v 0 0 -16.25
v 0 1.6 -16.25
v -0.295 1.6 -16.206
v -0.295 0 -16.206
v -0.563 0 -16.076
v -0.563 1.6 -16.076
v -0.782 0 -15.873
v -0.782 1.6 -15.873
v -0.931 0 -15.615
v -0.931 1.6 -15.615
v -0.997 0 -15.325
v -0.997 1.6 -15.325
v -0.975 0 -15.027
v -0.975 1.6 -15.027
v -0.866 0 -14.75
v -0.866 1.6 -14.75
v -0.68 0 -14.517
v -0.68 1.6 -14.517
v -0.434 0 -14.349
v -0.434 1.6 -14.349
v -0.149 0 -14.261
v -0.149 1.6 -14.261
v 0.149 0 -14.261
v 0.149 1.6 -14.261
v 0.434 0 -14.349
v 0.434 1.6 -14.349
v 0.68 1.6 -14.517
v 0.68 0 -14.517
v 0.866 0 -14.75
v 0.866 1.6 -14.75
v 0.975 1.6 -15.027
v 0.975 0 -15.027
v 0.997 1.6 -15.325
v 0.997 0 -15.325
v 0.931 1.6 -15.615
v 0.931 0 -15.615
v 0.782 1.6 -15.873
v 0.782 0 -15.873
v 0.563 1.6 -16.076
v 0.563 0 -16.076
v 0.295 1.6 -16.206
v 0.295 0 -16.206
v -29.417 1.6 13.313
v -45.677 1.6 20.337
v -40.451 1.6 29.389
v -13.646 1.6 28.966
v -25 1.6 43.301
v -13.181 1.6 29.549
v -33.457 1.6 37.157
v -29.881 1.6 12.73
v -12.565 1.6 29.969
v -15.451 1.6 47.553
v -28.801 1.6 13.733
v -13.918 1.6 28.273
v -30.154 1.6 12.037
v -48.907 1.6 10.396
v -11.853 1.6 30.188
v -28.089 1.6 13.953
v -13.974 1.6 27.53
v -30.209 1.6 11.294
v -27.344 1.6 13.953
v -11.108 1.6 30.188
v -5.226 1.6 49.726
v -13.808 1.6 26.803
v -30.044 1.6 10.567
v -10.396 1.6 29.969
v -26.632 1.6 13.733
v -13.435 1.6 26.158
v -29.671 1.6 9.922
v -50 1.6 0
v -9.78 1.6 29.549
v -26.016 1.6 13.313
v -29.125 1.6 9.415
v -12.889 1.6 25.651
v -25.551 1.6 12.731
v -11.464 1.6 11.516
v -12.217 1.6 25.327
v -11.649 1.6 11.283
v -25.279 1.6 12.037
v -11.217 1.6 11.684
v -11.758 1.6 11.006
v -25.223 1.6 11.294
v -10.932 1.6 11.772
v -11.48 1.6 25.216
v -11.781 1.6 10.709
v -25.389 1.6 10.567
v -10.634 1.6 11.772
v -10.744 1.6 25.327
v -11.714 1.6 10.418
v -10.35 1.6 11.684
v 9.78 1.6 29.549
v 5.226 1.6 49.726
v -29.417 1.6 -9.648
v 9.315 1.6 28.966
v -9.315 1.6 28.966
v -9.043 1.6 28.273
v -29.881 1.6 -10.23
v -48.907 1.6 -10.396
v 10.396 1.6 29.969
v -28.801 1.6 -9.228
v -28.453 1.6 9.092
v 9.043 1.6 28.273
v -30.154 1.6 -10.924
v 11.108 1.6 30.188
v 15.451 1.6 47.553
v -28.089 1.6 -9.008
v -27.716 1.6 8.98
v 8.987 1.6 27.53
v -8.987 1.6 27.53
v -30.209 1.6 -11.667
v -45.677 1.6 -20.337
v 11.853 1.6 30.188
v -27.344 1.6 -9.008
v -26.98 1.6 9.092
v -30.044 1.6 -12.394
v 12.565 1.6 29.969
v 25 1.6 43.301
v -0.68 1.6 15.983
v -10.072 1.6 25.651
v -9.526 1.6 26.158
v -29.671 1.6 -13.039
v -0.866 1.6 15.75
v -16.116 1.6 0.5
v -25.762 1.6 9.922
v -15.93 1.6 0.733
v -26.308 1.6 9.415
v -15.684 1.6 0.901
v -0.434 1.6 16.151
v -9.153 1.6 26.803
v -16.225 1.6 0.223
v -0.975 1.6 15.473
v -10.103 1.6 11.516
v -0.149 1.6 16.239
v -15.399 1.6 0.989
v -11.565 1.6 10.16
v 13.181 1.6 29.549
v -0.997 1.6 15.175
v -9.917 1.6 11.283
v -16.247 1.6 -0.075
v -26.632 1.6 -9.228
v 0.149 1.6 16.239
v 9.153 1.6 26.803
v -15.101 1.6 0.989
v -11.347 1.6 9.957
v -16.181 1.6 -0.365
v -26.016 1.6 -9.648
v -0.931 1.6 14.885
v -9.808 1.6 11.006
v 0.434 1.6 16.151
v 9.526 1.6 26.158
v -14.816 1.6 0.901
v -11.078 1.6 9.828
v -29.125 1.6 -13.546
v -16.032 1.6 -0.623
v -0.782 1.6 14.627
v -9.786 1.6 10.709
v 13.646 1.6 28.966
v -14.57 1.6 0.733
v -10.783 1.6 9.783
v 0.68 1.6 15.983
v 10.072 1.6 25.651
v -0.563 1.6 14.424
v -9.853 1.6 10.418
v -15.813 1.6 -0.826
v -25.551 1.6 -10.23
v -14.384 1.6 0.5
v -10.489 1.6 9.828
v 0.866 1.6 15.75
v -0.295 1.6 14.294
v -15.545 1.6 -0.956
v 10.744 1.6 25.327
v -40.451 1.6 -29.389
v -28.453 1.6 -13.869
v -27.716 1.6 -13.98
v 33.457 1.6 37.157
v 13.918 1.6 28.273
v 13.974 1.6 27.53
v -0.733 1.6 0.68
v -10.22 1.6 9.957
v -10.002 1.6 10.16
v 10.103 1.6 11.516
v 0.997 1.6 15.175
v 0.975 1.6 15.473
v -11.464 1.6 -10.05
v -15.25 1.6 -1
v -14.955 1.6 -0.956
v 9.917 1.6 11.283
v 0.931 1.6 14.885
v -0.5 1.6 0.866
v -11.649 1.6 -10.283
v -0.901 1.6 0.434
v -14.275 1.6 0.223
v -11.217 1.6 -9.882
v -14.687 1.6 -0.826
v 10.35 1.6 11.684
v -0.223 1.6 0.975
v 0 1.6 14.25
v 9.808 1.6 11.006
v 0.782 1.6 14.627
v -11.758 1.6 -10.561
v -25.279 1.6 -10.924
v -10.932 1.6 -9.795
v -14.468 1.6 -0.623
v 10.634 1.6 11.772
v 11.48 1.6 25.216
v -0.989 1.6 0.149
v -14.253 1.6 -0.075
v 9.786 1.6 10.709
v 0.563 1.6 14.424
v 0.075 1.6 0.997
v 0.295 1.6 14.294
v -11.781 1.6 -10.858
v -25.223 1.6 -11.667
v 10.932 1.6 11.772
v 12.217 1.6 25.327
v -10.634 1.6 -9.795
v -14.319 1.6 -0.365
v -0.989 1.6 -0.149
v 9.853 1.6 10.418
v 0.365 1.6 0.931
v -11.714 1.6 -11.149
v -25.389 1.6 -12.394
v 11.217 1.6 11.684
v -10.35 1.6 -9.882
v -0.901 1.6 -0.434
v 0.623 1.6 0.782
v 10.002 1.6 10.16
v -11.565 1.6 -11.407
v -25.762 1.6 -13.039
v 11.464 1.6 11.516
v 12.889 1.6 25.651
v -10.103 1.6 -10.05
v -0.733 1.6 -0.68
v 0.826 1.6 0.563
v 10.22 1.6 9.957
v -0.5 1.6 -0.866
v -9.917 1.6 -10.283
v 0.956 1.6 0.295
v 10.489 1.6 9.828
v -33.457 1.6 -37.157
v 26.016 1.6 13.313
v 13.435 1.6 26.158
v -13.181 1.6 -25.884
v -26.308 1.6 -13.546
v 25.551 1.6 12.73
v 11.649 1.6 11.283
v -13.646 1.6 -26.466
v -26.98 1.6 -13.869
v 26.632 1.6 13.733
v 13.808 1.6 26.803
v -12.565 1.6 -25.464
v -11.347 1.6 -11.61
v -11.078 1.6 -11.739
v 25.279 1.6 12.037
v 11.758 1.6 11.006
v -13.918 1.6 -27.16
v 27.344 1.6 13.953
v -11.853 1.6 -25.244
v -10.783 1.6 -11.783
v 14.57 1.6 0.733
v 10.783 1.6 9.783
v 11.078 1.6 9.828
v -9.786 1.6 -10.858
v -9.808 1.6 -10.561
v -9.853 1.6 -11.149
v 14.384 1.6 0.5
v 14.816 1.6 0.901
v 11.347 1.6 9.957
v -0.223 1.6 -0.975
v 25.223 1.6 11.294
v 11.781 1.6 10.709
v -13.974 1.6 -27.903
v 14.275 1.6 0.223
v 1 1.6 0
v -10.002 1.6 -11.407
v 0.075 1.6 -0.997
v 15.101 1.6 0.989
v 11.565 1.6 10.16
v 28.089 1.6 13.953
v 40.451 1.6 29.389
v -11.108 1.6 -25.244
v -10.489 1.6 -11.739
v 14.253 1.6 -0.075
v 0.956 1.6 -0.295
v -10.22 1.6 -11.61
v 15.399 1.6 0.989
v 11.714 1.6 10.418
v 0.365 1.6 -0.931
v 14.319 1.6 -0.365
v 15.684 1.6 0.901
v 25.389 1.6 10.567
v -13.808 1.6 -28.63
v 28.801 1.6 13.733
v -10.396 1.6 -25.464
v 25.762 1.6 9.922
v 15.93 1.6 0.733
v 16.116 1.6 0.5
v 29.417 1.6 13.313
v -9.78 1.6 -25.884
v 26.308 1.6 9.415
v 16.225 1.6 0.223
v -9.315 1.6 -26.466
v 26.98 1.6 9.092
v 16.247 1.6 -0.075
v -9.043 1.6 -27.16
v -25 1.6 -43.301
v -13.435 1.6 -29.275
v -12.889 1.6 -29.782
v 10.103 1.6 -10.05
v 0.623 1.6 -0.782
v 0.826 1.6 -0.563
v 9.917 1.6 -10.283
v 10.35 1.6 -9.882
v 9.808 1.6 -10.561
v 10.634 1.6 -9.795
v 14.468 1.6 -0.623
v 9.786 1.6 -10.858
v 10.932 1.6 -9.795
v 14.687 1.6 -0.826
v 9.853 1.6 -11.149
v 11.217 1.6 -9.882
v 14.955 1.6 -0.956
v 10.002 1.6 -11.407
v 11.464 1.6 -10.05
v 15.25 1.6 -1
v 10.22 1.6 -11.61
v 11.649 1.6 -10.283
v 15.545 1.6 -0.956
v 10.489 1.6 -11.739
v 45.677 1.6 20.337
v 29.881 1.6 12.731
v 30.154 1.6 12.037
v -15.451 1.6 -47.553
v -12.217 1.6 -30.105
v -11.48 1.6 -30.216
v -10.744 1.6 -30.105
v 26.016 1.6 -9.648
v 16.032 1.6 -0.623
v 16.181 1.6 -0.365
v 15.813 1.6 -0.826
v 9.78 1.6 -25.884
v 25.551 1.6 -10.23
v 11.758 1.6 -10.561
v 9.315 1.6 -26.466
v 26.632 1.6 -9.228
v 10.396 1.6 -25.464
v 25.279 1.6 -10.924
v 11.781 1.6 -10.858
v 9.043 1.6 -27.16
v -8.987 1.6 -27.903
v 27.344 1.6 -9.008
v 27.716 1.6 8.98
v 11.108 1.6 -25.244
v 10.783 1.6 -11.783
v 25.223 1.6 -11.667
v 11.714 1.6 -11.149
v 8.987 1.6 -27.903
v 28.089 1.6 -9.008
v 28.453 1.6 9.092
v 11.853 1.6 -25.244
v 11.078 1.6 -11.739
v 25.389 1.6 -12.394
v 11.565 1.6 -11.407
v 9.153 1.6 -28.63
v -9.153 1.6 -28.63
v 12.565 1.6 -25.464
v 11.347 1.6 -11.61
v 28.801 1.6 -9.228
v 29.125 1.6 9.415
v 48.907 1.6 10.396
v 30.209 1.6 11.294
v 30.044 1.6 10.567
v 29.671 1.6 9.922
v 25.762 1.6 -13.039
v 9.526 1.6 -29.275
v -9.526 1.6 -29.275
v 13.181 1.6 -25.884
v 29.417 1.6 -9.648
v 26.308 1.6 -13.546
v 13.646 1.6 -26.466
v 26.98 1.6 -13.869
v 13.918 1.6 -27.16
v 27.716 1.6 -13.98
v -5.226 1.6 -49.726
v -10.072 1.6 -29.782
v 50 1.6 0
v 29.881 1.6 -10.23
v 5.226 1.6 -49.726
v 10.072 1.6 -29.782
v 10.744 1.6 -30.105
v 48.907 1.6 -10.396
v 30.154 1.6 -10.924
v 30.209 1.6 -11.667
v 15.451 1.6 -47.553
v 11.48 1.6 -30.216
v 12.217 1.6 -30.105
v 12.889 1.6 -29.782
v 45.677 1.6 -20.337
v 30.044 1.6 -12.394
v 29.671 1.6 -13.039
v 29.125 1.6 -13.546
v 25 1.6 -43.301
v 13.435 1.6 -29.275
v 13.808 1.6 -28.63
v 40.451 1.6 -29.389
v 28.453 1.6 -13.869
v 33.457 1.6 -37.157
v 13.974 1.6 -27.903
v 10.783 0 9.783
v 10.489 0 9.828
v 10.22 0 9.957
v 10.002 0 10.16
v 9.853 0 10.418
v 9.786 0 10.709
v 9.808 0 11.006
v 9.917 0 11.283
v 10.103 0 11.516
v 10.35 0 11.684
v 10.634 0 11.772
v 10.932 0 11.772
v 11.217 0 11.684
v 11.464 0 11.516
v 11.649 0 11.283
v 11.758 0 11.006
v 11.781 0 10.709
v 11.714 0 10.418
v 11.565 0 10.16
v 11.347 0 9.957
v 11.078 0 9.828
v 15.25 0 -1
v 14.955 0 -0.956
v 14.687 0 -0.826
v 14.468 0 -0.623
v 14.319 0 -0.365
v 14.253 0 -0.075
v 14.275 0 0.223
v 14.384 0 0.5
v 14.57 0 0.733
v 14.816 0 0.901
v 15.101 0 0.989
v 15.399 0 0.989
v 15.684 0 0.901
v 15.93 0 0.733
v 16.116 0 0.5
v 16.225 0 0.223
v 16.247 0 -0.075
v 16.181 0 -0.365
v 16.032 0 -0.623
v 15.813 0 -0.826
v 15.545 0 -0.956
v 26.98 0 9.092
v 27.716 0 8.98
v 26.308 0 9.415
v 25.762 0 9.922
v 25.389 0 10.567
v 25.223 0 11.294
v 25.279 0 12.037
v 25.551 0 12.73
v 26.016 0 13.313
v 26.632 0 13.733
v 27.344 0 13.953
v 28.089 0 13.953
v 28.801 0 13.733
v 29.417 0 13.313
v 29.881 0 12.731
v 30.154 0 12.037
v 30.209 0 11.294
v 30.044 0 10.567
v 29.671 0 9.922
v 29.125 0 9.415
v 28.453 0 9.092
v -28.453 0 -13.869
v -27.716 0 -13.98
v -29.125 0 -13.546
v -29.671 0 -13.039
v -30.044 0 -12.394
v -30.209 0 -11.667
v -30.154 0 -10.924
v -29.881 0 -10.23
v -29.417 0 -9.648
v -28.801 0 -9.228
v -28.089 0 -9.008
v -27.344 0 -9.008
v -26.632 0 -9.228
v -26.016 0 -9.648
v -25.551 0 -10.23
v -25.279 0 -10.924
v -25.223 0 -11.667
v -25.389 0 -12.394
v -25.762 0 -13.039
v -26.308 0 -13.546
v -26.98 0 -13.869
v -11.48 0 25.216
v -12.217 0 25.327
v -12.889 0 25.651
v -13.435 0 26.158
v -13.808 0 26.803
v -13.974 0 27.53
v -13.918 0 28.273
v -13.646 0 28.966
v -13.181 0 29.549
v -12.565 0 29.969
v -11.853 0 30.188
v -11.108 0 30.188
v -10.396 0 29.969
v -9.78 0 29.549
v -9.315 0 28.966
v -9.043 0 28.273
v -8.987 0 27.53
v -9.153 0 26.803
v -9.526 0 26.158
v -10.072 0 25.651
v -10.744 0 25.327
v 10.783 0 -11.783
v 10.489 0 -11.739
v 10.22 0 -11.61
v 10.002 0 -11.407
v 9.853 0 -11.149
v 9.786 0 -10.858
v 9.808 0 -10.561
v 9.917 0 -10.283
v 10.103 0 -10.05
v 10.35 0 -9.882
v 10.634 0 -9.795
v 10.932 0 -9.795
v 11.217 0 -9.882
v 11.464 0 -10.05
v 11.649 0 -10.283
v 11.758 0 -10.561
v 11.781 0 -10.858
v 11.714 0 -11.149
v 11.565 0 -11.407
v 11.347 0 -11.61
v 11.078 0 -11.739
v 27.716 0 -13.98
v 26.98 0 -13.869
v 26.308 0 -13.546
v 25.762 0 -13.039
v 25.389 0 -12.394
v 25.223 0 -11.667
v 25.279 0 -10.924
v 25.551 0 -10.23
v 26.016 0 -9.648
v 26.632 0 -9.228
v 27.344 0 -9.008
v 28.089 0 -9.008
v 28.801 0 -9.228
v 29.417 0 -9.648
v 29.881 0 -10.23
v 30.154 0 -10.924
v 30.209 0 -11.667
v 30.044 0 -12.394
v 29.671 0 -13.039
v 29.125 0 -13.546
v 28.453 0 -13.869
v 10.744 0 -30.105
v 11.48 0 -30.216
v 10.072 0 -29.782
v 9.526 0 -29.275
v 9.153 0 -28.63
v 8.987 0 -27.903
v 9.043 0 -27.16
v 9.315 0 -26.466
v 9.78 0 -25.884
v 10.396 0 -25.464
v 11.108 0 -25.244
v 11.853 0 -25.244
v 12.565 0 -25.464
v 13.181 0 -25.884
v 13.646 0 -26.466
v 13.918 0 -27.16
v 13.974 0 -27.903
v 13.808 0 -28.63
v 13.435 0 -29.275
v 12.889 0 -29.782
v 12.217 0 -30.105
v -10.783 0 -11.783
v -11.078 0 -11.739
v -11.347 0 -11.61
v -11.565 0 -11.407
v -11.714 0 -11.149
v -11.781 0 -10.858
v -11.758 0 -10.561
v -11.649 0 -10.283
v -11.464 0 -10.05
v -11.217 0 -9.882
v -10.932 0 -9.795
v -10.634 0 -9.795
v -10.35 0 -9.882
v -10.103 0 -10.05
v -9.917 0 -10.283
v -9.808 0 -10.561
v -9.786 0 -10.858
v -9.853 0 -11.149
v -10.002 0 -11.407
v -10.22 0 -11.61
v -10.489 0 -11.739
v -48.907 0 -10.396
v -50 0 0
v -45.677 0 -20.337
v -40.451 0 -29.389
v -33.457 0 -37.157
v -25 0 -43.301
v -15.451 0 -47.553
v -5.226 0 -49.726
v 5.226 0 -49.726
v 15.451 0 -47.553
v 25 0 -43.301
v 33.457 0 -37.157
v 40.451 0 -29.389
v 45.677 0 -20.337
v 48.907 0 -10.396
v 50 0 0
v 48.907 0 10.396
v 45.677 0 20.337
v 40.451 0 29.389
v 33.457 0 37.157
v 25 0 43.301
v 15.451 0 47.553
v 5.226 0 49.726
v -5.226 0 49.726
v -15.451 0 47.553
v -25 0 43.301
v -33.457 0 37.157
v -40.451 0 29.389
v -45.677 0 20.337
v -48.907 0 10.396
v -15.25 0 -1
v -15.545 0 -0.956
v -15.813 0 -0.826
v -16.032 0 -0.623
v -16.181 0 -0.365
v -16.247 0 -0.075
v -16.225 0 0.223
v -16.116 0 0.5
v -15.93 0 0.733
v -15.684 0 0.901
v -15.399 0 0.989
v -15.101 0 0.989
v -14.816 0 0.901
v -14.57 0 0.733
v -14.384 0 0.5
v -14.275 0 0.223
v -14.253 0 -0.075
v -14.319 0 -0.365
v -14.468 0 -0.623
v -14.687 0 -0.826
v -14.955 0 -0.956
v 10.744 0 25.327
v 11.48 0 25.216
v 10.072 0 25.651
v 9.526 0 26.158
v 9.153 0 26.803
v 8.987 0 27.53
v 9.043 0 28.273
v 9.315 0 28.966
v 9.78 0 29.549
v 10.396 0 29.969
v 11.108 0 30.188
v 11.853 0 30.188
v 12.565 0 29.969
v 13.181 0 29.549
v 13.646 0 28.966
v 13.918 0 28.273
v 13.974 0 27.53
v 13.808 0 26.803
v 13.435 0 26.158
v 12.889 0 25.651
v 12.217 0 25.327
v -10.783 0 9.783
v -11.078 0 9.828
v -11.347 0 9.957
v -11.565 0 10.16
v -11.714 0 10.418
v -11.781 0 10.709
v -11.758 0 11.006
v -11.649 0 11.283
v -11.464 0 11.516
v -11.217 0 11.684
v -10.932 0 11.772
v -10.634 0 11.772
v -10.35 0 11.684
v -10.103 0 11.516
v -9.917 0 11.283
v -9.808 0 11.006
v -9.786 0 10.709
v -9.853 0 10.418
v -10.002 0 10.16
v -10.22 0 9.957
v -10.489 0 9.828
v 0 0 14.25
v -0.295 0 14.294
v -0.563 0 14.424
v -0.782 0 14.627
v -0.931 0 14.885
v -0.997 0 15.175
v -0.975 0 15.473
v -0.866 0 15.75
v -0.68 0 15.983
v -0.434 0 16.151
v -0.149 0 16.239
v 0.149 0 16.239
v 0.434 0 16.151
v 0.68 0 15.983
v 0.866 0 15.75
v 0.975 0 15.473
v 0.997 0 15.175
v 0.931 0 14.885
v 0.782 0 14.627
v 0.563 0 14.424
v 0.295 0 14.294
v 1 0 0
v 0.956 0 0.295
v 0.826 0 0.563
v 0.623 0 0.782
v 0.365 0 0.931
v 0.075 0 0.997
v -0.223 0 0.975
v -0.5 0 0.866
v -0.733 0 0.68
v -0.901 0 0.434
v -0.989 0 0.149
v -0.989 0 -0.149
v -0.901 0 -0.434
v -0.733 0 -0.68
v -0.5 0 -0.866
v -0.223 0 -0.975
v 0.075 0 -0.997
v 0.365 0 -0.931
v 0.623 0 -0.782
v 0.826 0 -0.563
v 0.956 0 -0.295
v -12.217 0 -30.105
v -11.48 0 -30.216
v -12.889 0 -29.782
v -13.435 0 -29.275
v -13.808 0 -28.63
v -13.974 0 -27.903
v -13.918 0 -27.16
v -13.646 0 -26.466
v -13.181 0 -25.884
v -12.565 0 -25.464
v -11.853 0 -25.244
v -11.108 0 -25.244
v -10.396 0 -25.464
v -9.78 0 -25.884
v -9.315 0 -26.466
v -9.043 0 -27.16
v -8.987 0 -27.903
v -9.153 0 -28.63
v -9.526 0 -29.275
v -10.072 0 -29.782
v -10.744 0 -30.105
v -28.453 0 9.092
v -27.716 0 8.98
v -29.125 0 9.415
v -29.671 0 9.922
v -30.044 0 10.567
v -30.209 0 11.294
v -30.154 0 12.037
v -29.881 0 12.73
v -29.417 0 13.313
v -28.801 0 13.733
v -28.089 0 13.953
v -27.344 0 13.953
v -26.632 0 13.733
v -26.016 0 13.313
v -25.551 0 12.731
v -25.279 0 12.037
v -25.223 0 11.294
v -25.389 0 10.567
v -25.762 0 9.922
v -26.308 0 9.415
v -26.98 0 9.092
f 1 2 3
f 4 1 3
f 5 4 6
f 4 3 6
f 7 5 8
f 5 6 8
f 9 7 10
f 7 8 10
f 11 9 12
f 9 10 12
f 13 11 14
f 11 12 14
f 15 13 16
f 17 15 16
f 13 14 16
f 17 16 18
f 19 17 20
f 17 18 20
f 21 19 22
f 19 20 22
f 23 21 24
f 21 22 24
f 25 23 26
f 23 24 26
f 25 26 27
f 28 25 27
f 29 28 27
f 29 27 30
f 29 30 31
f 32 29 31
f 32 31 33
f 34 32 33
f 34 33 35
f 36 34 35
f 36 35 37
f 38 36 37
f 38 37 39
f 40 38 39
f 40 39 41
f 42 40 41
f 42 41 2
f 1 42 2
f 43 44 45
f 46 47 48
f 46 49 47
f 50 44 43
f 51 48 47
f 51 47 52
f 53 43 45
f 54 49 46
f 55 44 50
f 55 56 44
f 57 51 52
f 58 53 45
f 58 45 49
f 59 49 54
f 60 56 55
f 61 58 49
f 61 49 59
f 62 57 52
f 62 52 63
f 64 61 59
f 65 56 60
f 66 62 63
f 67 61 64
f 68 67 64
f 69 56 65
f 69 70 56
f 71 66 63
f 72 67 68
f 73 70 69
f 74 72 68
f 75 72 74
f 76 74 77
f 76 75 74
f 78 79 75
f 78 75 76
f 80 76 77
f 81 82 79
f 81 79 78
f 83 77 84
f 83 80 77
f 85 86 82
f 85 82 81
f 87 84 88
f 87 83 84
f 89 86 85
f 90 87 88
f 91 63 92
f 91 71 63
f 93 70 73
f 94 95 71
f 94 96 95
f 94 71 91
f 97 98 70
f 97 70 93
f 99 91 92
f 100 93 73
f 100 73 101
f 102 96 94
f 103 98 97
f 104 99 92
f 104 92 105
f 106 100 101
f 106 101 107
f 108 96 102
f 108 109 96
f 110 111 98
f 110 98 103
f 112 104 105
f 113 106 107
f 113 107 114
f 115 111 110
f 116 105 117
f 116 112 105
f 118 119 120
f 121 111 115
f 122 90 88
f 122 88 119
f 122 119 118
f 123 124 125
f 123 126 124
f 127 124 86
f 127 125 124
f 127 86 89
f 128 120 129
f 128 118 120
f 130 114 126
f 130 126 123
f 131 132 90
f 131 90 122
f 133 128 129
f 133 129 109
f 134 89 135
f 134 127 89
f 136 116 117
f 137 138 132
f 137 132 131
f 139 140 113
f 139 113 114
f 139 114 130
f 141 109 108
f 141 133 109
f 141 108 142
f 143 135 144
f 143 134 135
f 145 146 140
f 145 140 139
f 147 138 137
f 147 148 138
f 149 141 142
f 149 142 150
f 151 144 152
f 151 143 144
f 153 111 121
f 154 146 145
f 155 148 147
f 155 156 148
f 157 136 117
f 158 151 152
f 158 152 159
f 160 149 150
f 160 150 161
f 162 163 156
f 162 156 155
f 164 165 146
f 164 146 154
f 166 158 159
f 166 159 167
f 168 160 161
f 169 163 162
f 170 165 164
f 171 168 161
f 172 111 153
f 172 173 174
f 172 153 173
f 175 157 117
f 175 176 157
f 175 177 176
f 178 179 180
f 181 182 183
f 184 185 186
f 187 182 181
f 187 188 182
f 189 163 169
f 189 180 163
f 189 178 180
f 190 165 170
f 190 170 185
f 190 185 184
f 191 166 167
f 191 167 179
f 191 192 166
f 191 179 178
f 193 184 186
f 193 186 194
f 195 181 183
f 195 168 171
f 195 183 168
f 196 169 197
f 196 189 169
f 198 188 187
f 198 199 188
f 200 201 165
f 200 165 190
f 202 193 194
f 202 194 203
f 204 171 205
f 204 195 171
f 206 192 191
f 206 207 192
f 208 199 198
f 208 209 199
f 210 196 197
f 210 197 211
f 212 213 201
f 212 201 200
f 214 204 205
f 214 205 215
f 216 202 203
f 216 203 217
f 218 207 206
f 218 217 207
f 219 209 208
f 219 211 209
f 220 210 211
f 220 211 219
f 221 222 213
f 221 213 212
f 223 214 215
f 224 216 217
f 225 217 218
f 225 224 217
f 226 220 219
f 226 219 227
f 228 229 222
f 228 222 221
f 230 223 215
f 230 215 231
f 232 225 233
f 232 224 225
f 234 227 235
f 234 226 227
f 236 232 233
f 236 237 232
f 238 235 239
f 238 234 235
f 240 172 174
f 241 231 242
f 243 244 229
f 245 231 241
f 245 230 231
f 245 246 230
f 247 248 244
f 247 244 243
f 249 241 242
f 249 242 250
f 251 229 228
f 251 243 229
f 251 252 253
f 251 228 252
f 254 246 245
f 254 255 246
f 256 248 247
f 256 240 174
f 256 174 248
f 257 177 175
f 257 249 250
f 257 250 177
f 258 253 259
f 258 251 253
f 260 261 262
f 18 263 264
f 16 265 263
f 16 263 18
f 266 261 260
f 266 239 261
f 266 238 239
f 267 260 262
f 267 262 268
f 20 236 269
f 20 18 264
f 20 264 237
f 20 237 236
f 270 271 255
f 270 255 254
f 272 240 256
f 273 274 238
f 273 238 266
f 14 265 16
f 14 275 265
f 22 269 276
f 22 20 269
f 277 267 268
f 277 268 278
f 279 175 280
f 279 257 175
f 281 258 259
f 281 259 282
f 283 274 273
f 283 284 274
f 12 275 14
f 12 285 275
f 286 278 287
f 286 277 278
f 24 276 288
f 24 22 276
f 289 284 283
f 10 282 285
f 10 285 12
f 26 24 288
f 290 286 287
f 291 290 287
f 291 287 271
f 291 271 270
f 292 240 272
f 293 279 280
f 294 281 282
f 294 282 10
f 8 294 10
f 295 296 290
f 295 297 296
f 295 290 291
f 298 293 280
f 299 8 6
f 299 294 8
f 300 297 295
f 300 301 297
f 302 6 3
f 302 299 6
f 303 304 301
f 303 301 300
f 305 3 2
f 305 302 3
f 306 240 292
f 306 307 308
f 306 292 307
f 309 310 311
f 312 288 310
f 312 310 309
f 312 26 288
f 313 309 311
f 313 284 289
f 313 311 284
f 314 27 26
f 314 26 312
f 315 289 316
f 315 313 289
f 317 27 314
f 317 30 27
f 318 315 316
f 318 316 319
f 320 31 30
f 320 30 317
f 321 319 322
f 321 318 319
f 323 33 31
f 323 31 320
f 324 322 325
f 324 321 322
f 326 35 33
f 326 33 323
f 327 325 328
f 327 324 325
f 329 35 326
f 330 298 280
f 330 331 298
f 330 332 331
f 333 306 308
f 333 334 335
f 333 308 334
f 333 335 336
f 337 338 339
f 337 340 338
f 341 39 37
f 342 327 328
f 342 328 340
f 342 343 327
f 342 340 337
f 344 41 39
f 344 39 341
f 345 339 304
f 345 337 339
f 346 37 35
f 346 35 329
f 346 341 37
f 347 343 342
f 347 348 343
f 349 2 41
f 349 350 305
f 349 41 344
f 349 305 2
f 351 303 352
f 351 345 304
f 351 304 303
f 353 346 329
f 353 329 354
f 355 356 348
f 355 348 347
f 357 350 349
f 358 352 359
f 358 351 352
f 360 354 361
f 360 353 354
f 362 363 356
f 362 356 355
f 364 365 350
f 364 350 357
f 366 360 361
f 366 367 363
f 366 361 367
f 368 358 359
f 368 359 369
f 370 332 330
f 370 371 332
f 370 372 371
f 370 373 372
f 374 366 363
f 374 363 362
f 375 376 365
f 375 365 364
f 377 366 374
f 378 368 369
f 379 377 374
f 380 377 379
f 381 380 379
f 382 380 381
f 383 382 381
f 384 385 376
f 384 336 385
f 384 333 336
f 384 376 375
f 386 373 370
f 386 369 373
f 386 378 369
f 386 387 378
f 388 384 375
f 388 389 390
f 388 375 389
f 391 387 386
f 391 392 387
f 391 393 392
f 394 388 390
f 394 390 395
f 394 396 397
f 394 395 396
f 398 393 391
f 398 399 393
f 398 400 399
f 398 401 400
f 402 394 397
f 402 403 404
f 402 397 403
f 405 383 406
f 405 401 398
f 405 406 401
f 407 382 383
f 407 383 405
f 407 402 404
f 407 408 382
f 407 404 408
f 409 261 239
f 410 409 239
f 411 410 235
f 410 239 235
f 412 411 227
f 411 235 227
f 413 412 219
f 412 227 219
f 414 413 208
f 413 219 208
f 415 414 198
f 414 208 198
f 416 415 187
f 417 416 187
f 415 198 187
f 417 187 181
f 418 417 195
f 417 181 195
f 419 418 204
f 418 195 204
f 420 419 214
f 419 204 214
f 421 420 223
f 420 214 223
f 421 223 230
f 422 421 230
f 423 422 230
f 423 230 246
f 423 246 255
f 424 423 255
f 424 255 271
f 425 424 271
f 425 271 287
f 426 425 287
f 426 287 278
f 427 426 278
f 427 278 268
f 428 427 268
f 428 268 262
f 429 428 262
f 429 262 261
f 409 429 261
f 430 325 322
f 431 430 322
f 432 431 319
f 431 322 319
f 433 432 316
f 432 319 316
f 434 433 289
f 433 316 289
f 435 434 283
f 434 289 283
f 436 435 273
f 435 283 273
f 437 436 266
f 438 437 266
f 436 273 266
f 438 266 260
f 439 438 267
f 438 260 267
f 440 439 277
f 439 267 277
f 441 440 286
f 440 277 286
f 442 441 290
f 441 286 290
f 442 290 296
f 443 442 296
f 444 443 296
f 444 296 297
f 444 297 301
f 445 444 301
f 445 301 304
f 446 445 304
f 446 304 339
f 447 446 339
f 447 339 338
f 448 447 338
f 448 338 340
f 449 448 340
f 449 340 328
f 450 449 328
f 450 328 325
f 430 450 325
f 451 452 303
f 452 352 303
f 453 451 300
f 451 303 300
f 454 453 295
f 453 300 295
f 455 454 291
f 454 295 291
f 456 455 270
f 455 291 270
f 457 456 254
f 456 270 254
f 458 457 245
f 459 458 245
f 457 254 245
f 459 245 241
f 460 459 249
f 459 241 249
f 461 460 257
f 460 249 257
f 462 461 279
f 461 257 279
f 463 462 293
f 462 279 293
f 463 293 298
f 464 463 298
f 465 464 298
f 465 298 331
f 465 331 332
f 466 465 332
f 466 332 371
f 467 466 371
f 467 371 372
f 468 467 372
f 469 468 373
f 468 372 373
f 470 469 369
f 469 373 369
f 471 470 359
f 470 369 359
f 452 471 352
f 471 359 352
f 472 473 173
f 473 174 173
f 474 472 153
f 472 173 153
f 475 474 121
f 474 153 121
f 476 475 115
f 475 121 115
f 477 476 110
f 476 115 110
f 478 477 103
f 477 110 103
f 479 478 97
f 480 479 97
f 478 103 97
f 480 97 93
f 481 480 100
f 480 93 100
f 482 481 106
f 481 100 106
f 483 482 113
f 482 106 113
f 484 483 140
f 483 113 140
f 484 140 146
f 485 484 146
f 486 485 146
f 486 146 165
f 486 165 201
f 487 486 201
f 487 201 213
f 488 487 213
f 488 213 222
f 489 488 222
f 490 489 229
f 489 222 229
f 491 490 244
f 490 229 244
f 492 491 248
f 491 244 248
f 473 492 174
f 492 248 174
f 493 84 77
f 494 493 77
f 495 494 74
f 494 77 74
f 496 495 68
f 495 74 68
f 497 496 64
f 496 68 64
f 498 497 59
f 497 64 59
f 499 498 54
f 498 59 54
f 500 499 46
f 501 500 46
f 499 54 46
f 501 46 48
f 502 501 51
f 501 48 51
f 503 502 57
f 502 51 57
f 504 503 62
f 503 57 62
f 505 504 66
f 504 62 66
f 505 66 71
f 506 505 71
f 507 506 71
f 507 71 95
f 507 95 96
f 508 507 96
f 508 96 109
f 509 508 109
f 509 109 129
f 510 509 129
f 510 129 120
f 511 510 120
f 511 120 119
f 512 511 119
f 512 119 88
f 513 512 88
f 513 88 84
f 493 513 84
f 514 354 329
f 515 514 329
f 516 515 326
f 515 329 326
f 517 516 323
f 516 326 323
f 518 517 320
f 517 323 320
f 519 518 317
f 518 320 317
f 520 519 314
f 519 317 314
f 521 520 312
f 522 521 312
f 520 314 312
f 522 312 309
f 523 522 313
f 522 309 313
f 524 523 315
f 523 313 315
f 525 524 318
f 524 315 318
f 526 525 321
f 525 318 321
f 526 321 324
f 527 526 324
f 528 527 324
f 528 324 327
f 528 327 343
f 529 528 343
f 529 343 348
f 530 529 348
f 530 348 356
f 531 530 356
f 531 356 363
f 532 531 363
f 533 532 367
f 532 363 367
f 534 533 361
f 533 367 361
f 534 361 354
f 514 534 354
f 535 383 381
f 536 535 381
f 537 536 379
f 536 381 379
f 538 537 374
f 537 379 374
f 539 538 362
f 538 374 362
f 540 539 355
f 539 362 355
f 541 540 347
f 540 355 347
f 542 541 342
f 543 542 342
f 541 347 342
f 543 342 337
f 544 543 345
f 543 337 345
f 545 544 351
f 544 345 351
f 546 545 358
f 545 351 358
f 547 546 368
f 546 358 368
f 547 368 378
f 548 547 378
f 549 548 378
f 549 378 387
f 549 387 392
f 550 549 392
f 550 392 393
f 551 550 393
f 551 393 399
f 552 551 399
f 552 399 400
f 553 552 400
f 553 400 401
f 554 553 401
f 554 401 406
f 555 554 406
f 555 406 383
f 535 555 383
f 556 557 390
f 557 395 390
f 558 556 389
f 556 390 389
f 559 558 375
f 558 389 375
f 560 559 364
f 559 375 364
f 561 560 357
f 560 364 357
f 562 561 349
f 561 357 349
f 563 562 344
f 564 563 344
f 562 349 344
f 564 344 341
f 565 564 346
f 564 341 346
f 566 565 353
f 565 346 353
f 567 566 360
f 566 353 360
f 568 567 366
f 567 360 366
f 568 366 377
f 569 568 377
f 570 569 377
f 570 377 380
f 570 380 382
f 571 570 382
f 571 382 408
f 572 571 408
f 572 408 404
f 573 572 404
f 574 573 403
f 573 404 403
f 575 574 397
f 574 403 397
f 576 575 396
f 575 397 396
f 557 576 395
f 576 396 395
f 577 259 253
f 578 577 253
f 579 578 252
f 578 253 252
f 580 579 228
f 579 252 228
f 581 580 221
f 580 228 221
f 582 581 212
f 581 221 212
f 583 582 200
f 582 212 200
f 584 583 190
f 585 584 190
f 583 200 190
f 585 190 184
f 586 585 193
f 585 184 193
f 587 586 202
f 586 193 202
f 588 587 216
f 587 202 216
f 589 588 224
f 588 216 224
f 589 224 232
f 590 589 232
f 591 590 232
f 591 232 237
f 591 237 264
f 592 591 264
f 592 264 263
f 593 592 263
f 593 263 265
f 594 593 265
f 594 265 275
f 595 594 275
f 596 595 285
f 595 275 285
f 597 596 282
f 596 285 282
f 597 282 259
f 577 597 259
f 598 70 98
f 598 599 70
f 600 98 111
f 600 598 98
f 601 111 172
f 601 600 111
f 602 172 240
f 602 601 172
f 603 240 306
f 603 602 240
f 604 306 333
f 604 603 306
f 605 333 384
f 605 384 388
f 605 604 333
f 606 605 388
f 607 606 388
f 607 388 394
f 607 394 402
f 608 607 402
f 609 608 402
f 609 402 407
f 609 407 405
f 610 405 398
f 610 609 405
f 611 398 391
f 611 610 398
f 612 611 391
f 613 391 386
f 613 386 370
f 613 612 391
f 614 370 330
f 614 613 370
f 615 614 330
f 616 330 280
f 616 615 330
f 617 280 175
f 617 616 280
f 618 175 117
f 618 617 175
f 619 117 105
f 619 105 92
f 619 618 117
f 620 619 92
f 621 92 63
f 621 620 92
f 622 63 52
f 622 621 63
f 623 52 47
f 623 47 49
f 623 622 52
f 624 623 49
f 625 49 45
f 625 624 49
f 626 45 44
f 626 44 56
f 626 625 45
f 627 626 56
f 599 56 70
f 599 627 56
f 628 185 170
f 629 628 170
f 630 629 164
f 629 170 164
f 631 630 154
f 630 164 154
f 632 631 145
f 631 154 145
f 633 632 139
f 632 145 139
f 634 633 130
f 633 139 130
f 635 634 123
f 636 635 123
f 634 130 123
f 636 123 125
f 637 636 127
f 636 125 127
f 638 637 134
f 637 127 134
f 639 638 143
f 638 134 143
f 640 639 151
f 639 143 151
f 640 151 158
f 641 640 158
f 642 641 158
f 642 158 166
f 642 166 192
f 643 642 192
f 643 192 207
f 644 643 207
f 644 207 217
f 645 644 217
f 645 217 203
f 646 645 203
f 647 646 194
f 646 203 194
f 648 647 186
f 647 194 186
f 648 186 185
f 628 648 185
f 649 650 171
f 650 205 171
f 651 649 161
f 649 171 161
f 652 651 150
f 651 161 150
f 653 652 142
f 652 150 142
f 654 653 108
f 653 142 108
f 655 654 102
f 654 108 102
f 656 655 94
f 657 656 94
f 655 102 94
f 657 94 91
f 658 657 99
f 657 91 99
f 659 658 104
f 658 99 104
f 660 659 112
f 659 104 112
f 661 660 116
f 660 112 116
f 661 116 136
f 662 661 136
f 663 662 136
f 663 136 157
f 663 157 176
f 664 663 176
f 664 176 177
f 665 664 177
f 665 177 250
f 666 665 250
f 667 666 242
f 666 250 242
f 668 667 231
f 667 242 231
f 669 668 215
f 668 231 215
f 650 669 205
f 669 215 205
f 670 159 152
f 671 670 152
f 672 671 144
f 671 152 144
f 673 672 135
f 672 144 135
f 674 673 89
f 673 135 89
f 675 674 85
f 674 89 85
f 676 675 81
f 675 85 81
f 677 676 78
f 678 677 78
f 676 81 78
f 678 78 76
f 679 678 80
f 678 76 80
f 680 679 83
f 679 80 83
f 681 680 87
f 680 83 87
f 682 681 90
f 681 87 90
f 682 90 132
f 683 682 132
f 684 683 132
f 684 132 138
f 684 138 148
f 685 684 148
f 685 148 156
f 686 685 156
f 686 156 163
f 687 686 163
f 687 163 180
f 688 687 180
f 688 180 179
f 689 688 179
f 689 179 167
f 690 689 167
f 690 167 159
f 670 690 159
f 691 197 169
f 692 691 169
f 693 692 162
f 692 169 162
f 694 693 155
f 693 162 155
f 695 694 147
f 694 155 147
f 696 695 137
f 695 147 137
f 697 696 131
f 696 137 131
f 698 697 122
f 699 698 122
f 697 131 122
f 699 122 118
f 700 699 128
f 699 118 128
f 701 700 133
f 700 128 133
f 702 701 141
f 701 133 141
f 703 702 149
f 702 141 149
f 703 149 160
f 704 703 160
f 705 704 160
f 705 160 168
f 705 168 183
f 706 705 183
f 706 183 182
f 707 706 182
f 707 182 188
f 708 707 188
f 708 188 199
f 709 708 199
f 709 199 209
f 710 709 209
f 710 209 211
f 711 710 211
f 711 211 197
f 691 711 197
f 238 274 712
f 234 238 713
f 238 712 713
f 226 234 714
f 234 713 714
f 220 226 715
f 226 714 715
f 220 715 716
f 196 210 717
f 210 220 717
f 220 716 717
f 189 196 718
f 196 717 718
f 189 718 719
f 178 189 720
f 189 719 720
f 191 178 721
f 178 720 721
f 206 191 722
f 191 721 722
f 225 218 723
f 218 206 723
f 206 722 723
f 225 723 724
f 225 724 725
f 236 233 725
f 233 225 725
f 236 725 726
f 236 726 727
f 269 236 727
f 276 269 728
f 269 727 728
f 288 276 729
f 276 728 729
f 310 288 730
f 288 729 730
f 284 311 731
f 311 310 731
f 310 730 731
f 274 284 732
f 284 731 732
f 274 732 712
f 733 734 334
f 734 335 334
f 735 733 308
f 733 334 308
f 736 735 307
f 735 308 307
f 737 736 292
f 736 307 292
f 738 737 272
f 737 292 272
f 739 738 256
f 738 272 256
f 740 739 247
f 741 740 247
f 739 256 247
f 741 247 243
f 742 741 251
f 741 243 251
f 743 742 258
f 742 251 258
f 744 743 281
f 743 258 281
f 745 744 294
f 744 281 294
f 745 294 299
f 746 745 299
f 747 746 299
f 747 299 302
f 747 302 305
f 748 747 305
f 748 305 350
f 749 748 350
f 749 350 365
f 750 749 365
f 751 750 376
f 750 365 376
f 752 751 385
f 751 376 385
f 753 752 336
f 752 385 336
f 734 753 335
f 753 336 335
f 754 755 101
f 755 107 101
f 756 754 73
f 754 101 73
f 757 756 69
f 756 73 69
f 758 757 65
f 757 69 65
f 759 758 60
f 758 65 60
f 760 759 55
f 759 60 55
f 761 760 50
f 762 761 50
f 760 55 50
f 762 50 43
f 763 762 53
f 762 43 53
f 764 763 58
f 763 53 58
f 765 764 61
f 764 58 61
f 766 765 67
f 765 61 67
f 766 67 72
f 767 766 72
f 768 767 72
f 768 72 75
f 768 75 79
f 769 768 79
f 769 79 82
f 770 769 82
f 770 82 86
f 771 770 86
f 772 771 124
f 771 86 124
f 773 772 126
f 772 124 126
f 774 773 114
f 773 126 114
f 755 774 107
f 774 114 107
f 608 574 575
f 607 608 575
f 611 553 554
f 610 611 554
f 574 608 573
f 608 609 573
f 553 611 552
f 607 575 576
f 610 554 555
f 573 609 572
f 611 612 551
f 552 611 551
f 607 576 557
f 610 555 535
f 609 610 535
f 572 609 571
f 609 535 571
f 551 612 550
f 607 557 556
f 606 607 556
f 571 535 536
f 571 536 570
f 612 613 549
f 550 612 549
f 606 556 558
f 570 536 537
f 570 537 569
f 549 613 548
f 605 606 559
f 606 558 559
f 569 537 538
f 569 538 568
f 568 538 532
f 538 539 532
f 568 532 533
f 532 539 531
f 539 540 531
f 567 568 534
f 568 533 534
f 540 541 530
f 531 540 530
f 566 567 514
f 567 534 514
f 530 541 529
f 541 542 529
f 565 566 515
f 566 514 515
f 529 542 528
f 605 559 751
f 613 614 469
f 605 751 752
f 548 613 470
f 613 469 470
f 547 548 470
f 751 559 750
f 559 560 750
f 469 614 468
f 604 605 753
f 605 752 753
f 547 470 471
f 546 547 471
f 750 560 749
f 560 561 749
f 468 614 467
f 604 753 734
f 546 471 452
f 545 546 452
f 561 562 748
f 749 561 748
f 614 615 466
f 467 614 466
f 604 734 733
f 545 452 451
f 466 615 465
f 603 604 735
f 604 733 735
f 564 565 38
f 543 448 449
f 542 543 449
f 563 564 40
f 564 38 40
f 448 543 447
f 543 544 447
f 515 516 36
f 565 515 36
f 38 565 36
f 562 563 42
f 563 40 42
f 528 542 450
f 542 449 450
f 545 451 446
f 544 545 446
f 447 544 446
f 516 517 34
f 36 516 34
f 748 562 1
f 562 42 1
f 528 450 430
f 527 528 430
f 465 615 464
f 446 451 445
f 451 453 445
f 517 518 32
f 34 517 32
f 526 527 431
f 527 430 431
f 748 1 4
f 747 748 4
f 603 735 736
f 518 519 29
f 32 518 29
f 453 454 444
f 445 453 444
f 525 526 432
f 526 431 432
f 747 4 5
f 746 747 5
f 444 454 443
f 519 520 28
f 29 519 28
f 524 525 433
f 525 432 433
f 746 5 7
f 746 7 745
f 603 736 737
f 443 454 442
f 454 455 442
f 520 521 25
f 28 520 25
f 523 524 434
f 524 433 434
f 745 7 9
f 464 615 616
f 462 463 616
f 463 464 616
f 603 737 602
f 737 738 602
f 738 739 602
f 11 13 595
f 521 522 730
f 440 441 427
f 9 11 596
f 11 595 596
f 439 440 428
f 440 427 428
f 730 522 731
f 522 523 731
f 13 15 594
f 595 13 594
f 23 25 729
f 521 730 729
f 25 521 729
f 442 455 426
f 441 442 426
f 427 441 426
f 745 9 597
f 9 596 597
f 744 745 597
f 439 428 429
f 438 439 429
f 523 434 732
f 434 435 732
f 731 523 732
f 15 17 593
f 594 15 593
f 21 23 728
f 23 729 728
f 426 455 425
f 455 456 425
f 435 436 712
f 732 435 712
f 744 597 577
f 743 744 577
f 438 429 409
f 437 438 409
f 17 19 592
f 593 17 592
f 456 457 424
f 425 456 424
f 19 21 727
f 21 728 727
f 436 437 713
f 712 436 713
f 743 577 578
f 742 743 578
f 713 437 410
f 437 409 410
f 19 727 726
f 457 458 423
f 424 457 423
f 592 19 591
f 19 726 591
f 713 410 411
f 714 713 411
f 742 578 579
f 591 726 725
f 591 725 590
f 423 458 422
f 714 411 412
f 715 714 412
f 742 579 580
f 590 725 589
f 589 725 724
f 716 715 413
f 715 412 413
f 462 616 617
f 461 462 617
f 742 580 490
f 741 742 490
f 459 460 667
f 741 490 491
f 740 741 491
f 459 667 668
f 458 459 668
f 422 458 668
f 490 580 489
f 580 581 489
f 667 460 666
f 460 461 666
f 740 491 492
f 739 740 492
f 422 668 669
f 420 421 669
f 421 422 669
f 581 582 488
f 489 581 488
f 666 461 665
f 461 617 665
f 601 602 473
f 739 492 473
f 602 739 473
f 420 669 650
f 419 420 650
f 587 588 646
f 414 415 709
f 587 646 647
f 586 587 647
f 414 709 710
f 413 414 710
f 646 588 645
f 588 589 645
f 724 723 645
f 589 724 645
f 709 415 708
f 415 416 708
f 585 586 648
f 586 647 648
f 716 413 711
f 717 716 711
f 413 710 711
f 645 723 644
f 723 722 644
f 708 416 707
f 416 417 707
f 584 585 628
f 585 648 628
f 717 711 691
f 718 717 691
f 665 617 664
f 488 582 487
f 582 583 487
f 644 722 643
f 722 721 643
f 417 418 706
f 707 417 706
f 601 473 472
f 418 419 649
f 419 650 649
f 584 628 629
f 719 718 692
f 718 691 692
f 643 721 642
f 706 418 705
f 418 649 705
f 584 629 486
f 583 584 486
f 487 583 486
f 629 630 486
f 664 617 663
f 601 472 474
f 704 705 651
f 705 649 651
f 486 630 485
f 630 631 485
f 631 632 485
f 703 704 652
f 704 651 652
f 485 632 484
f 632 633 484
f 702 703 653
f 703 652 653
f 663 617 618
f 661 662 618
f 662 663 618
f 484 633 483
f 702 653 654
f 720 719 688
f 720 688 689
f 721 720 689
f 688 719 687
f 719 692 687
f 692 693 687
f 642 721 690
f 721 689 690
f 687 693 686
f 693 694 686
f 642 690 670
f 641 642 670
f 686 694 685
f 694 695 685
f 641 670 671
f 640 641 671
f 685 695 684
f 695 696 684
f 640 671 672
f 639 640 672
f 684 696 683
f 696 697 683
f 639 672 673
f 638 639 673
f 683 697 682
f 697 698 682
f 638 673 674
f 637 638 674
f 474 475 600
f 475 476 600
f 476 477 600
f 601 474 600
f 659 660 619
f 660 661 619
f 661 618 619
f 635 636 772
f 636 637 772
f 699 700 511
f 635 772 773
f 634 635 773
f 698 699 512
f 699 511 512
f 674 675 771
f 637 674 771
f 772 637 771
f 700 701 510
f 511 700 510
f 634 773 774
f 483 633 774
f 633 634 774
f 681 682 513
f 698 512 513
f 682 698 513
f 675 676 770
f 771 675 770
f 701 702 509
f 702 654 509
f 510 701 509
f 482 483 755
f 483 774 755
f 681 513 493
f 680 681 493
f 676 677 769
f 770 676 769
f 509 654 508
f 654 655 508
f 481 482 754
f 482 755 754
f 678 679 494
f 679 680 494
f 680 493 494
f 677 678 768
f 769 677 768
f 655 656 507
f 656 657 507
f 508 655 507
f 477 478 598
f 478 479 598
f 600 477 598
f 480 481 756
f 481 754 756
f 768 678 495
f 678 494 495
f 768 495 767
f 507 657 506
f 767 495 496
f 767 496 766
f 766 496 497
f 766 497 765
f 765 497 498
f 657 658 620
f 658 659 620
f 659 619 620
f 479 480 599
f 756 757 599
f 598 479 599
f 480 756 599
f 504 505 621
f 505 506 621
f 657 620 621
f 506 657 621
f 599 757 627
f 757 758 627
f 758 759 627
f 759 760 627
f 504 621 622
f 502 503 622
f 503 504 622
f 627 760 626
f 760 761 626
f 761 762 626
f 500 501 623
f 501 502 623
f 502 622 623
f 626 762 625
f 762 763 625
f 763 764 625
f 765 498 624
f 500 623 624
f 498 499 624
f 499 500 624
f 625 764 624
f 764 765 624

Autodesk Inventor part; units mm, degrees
ref_plane "XZ Plane" through (0, 0, 0) normal (0, 1, 0) x (-1, 0, 0)
ref_plane "XY Plane" through (0, 0, 0) normal (0, 0, 1) x (1, 0, 0)
sketch "Sketch1" plane through (0, 0, 0) normal (0, 1, 0) x (-1, 0, 0)
  circle A0 centre (0, 0) radius 50
  dimension "d0" = 100
extrude "Extrusion1" add sketch "Sketch1" along normal blind 20
ref_plane "Work Plane1" through (50, 0, 0) normal (1, 0, 0) x (0, 1, 0)
sketch "Sketch2" plane through (50, 0, 0) normal (1, 0, 0) x (0, 1, 0)
  line L0 (20, -50) -> (20, 50) projected
  line L1 (0, -50) -> (0, 50) projected
  point P0 (0, 0)
  point P1 (10, 0)
  dimension "d3" = 20
  dimension "d4" = 10
hole "Hole1" at (50, 10, 0) direction (-1, 0, 0) diameter 10 end through all
pattern_circular "Circular Pattern2" count 8 over 360 about axis through (0, -10, 0) along (0, 1, 0) of "Hole1"
sketch "Sketch4" plane through (0, 0, 0) normal (0, -1, 0) x (1, 0, 0)
  circle A0 centre (0, 0) radius 1
  dimension "d26" = 2
extrude "Extrusion2" cut sketch "Sketch4" against normal through all
sketch "Sketch5" plane through (0, 0, 0) normal (0, -1, 0) x (1, 0, 0)
  circle A0 centre (0, 0) radius 1 projected
  line L0 (-11.4805, 27.7164) -> (0, 0)
  line L1 (0, 0) -> (0, 50)
  circle A1 centre (0, 0) radius 50 projected
  point P0 (-27.7164, 11.4805)
  point P1 (-27.7164, -11.4805)
  point P2 (-11.4805, -27.7164)
  point P3 (11.4805, -27.7164)
  point P4 (27.7164, -11.4805)
  point P5 (27.7164, 11.4805)
  point P6 (11.4805, 27.7164)
  dimension "d31" = 30
  dimension "d32" = 22.5
  dimension "d35" = 360
hole "Hole3" at (-11.4805, 0, 27.7164) at (-27.7164, 0, 11.4805) at (-27.7164, 0, -11.4805) at (-11.4805, 0, -27.7164) at (11.4805, 0, -27.7164) at (27.7164, 0, -11.4805) at (27.7164, 0, 11.4805) at (11.4805, 0, 27.7164) direction (0, 1, 0) diameter 5 end through all
chamfer "Chamfer2" distance 1 angle 45 32 edges at (-49.8543, 6.7667, -3.8139) (-49.8545, 13.2353, -3.8122) (-49.8543, 13.2328, 3.8143) (-49.8544, 6.7652, 3.8126) (49.8545, 13.2353, -3.8122) (49.8543, 13.2328, 3.8143) (49.8543, 6.7667, -3.8139) (49.8544, 6.7652, 3.8126) (-37.9567, 6.7803, 32.5468) (-37.9554, 13.222, 32.5482) (-32.5468, 6.7803, 37.9567) (-32.5468, 13.2197, 37.9567) (32.5482, 13.222, -37.9554) (37.9567, 13.2197, -32.5468) (32.5468, 6.7803, -37.9567) (37.9567, 6.7803, -32.5468) (32.5468, 6.7803, 37.9567) (32.5482, 13.222, 37.9554) (37.9567, 6.7803, 32.5468) (37.9567, 13.2197, 32.5468) (-37.9554, 13.222, -32.5482) (-32.5468, 13.2197, -37.9567) (-37.9567, 6.7803, -32.5468) (-32.5468, 6.7803, -37.9567) (-3.8254, 6.7803, 49.8535) (-3.8235, 13.222, 49.8536) (3.8254, 6.7803, 49.8535) (3.8254, 13.2197, 49.8535) (-3.8235, 13.222, -49.8536) (3.8254, 13.2197, -49.8535) (-3.8254, 6.7803, -49.8535) (3.8254, 6.7803, -49.8535)
sketch "Sketch6" plane through (0, 20, 0) normal (0, 1, 0) x (1, 0, 0)
  circle A0 centre (0, 0) radius 60
  dimension "d50" = 120
extrude "Extrusion3" cut sketch "Sketch6" against normal blind 10.25
sketch "Sketch7" plane through (0, 9.75, 0) normal (0, 1, 0) x (1, 0, 0)
  circle A0 centre (0, 0) radius 17.5
  dimension "d53" = 35
extrude "Extrusion4" cut sketch "Sketch7" against normal blind 5
sketch "Sketch8" plane through (0, 0, 0) normal (0, -1, 0) x (1, 0, 0)
  point P0 (0, 0)
  point P1 (15.25, 0)
  point P2 (10.7834, 10.7834)
  point P3 (0, 15.25)
  point P4 (-10.7834, 10.7834)
  point P5 (-15.25, 0)
  point P6 (-10.7834, -10.7834)
  point P7 (0, -15.25)
  point P8 (10.7834, -10.7834)
  dimension "d56" = 15.25
  dimension "d59" = 360
hole "Hole4" at (15.25, 0, 0) at (10.7834, 0, 10.7834) at (0, 0, 15.25) at (-10.7834, 0, 10.7834) at (-15.25, 0, 0) at (-10.7834, 0, -10.7834) at (0, 0, -15.25) at (10.7834, 0, -10.7834) direction (0, 1, 0) diameter 2 end through all
sketch "Sketch9" plane through (0, 9.75, 0) normal (0, 1, 0) x (1, 0, 0)
  circle A0 centre (0, 0) radius 1 projected
  circle A1 centre (0, 0) radius 60
  dimension "d68" = 120
extrude "Extrusion5" cut sketch "Sketch9" against normal blind 8.15
equation "\"d4\" = 0.5 * d3"
properties part number "CUT_FR4_Top_Disc_PCB"
